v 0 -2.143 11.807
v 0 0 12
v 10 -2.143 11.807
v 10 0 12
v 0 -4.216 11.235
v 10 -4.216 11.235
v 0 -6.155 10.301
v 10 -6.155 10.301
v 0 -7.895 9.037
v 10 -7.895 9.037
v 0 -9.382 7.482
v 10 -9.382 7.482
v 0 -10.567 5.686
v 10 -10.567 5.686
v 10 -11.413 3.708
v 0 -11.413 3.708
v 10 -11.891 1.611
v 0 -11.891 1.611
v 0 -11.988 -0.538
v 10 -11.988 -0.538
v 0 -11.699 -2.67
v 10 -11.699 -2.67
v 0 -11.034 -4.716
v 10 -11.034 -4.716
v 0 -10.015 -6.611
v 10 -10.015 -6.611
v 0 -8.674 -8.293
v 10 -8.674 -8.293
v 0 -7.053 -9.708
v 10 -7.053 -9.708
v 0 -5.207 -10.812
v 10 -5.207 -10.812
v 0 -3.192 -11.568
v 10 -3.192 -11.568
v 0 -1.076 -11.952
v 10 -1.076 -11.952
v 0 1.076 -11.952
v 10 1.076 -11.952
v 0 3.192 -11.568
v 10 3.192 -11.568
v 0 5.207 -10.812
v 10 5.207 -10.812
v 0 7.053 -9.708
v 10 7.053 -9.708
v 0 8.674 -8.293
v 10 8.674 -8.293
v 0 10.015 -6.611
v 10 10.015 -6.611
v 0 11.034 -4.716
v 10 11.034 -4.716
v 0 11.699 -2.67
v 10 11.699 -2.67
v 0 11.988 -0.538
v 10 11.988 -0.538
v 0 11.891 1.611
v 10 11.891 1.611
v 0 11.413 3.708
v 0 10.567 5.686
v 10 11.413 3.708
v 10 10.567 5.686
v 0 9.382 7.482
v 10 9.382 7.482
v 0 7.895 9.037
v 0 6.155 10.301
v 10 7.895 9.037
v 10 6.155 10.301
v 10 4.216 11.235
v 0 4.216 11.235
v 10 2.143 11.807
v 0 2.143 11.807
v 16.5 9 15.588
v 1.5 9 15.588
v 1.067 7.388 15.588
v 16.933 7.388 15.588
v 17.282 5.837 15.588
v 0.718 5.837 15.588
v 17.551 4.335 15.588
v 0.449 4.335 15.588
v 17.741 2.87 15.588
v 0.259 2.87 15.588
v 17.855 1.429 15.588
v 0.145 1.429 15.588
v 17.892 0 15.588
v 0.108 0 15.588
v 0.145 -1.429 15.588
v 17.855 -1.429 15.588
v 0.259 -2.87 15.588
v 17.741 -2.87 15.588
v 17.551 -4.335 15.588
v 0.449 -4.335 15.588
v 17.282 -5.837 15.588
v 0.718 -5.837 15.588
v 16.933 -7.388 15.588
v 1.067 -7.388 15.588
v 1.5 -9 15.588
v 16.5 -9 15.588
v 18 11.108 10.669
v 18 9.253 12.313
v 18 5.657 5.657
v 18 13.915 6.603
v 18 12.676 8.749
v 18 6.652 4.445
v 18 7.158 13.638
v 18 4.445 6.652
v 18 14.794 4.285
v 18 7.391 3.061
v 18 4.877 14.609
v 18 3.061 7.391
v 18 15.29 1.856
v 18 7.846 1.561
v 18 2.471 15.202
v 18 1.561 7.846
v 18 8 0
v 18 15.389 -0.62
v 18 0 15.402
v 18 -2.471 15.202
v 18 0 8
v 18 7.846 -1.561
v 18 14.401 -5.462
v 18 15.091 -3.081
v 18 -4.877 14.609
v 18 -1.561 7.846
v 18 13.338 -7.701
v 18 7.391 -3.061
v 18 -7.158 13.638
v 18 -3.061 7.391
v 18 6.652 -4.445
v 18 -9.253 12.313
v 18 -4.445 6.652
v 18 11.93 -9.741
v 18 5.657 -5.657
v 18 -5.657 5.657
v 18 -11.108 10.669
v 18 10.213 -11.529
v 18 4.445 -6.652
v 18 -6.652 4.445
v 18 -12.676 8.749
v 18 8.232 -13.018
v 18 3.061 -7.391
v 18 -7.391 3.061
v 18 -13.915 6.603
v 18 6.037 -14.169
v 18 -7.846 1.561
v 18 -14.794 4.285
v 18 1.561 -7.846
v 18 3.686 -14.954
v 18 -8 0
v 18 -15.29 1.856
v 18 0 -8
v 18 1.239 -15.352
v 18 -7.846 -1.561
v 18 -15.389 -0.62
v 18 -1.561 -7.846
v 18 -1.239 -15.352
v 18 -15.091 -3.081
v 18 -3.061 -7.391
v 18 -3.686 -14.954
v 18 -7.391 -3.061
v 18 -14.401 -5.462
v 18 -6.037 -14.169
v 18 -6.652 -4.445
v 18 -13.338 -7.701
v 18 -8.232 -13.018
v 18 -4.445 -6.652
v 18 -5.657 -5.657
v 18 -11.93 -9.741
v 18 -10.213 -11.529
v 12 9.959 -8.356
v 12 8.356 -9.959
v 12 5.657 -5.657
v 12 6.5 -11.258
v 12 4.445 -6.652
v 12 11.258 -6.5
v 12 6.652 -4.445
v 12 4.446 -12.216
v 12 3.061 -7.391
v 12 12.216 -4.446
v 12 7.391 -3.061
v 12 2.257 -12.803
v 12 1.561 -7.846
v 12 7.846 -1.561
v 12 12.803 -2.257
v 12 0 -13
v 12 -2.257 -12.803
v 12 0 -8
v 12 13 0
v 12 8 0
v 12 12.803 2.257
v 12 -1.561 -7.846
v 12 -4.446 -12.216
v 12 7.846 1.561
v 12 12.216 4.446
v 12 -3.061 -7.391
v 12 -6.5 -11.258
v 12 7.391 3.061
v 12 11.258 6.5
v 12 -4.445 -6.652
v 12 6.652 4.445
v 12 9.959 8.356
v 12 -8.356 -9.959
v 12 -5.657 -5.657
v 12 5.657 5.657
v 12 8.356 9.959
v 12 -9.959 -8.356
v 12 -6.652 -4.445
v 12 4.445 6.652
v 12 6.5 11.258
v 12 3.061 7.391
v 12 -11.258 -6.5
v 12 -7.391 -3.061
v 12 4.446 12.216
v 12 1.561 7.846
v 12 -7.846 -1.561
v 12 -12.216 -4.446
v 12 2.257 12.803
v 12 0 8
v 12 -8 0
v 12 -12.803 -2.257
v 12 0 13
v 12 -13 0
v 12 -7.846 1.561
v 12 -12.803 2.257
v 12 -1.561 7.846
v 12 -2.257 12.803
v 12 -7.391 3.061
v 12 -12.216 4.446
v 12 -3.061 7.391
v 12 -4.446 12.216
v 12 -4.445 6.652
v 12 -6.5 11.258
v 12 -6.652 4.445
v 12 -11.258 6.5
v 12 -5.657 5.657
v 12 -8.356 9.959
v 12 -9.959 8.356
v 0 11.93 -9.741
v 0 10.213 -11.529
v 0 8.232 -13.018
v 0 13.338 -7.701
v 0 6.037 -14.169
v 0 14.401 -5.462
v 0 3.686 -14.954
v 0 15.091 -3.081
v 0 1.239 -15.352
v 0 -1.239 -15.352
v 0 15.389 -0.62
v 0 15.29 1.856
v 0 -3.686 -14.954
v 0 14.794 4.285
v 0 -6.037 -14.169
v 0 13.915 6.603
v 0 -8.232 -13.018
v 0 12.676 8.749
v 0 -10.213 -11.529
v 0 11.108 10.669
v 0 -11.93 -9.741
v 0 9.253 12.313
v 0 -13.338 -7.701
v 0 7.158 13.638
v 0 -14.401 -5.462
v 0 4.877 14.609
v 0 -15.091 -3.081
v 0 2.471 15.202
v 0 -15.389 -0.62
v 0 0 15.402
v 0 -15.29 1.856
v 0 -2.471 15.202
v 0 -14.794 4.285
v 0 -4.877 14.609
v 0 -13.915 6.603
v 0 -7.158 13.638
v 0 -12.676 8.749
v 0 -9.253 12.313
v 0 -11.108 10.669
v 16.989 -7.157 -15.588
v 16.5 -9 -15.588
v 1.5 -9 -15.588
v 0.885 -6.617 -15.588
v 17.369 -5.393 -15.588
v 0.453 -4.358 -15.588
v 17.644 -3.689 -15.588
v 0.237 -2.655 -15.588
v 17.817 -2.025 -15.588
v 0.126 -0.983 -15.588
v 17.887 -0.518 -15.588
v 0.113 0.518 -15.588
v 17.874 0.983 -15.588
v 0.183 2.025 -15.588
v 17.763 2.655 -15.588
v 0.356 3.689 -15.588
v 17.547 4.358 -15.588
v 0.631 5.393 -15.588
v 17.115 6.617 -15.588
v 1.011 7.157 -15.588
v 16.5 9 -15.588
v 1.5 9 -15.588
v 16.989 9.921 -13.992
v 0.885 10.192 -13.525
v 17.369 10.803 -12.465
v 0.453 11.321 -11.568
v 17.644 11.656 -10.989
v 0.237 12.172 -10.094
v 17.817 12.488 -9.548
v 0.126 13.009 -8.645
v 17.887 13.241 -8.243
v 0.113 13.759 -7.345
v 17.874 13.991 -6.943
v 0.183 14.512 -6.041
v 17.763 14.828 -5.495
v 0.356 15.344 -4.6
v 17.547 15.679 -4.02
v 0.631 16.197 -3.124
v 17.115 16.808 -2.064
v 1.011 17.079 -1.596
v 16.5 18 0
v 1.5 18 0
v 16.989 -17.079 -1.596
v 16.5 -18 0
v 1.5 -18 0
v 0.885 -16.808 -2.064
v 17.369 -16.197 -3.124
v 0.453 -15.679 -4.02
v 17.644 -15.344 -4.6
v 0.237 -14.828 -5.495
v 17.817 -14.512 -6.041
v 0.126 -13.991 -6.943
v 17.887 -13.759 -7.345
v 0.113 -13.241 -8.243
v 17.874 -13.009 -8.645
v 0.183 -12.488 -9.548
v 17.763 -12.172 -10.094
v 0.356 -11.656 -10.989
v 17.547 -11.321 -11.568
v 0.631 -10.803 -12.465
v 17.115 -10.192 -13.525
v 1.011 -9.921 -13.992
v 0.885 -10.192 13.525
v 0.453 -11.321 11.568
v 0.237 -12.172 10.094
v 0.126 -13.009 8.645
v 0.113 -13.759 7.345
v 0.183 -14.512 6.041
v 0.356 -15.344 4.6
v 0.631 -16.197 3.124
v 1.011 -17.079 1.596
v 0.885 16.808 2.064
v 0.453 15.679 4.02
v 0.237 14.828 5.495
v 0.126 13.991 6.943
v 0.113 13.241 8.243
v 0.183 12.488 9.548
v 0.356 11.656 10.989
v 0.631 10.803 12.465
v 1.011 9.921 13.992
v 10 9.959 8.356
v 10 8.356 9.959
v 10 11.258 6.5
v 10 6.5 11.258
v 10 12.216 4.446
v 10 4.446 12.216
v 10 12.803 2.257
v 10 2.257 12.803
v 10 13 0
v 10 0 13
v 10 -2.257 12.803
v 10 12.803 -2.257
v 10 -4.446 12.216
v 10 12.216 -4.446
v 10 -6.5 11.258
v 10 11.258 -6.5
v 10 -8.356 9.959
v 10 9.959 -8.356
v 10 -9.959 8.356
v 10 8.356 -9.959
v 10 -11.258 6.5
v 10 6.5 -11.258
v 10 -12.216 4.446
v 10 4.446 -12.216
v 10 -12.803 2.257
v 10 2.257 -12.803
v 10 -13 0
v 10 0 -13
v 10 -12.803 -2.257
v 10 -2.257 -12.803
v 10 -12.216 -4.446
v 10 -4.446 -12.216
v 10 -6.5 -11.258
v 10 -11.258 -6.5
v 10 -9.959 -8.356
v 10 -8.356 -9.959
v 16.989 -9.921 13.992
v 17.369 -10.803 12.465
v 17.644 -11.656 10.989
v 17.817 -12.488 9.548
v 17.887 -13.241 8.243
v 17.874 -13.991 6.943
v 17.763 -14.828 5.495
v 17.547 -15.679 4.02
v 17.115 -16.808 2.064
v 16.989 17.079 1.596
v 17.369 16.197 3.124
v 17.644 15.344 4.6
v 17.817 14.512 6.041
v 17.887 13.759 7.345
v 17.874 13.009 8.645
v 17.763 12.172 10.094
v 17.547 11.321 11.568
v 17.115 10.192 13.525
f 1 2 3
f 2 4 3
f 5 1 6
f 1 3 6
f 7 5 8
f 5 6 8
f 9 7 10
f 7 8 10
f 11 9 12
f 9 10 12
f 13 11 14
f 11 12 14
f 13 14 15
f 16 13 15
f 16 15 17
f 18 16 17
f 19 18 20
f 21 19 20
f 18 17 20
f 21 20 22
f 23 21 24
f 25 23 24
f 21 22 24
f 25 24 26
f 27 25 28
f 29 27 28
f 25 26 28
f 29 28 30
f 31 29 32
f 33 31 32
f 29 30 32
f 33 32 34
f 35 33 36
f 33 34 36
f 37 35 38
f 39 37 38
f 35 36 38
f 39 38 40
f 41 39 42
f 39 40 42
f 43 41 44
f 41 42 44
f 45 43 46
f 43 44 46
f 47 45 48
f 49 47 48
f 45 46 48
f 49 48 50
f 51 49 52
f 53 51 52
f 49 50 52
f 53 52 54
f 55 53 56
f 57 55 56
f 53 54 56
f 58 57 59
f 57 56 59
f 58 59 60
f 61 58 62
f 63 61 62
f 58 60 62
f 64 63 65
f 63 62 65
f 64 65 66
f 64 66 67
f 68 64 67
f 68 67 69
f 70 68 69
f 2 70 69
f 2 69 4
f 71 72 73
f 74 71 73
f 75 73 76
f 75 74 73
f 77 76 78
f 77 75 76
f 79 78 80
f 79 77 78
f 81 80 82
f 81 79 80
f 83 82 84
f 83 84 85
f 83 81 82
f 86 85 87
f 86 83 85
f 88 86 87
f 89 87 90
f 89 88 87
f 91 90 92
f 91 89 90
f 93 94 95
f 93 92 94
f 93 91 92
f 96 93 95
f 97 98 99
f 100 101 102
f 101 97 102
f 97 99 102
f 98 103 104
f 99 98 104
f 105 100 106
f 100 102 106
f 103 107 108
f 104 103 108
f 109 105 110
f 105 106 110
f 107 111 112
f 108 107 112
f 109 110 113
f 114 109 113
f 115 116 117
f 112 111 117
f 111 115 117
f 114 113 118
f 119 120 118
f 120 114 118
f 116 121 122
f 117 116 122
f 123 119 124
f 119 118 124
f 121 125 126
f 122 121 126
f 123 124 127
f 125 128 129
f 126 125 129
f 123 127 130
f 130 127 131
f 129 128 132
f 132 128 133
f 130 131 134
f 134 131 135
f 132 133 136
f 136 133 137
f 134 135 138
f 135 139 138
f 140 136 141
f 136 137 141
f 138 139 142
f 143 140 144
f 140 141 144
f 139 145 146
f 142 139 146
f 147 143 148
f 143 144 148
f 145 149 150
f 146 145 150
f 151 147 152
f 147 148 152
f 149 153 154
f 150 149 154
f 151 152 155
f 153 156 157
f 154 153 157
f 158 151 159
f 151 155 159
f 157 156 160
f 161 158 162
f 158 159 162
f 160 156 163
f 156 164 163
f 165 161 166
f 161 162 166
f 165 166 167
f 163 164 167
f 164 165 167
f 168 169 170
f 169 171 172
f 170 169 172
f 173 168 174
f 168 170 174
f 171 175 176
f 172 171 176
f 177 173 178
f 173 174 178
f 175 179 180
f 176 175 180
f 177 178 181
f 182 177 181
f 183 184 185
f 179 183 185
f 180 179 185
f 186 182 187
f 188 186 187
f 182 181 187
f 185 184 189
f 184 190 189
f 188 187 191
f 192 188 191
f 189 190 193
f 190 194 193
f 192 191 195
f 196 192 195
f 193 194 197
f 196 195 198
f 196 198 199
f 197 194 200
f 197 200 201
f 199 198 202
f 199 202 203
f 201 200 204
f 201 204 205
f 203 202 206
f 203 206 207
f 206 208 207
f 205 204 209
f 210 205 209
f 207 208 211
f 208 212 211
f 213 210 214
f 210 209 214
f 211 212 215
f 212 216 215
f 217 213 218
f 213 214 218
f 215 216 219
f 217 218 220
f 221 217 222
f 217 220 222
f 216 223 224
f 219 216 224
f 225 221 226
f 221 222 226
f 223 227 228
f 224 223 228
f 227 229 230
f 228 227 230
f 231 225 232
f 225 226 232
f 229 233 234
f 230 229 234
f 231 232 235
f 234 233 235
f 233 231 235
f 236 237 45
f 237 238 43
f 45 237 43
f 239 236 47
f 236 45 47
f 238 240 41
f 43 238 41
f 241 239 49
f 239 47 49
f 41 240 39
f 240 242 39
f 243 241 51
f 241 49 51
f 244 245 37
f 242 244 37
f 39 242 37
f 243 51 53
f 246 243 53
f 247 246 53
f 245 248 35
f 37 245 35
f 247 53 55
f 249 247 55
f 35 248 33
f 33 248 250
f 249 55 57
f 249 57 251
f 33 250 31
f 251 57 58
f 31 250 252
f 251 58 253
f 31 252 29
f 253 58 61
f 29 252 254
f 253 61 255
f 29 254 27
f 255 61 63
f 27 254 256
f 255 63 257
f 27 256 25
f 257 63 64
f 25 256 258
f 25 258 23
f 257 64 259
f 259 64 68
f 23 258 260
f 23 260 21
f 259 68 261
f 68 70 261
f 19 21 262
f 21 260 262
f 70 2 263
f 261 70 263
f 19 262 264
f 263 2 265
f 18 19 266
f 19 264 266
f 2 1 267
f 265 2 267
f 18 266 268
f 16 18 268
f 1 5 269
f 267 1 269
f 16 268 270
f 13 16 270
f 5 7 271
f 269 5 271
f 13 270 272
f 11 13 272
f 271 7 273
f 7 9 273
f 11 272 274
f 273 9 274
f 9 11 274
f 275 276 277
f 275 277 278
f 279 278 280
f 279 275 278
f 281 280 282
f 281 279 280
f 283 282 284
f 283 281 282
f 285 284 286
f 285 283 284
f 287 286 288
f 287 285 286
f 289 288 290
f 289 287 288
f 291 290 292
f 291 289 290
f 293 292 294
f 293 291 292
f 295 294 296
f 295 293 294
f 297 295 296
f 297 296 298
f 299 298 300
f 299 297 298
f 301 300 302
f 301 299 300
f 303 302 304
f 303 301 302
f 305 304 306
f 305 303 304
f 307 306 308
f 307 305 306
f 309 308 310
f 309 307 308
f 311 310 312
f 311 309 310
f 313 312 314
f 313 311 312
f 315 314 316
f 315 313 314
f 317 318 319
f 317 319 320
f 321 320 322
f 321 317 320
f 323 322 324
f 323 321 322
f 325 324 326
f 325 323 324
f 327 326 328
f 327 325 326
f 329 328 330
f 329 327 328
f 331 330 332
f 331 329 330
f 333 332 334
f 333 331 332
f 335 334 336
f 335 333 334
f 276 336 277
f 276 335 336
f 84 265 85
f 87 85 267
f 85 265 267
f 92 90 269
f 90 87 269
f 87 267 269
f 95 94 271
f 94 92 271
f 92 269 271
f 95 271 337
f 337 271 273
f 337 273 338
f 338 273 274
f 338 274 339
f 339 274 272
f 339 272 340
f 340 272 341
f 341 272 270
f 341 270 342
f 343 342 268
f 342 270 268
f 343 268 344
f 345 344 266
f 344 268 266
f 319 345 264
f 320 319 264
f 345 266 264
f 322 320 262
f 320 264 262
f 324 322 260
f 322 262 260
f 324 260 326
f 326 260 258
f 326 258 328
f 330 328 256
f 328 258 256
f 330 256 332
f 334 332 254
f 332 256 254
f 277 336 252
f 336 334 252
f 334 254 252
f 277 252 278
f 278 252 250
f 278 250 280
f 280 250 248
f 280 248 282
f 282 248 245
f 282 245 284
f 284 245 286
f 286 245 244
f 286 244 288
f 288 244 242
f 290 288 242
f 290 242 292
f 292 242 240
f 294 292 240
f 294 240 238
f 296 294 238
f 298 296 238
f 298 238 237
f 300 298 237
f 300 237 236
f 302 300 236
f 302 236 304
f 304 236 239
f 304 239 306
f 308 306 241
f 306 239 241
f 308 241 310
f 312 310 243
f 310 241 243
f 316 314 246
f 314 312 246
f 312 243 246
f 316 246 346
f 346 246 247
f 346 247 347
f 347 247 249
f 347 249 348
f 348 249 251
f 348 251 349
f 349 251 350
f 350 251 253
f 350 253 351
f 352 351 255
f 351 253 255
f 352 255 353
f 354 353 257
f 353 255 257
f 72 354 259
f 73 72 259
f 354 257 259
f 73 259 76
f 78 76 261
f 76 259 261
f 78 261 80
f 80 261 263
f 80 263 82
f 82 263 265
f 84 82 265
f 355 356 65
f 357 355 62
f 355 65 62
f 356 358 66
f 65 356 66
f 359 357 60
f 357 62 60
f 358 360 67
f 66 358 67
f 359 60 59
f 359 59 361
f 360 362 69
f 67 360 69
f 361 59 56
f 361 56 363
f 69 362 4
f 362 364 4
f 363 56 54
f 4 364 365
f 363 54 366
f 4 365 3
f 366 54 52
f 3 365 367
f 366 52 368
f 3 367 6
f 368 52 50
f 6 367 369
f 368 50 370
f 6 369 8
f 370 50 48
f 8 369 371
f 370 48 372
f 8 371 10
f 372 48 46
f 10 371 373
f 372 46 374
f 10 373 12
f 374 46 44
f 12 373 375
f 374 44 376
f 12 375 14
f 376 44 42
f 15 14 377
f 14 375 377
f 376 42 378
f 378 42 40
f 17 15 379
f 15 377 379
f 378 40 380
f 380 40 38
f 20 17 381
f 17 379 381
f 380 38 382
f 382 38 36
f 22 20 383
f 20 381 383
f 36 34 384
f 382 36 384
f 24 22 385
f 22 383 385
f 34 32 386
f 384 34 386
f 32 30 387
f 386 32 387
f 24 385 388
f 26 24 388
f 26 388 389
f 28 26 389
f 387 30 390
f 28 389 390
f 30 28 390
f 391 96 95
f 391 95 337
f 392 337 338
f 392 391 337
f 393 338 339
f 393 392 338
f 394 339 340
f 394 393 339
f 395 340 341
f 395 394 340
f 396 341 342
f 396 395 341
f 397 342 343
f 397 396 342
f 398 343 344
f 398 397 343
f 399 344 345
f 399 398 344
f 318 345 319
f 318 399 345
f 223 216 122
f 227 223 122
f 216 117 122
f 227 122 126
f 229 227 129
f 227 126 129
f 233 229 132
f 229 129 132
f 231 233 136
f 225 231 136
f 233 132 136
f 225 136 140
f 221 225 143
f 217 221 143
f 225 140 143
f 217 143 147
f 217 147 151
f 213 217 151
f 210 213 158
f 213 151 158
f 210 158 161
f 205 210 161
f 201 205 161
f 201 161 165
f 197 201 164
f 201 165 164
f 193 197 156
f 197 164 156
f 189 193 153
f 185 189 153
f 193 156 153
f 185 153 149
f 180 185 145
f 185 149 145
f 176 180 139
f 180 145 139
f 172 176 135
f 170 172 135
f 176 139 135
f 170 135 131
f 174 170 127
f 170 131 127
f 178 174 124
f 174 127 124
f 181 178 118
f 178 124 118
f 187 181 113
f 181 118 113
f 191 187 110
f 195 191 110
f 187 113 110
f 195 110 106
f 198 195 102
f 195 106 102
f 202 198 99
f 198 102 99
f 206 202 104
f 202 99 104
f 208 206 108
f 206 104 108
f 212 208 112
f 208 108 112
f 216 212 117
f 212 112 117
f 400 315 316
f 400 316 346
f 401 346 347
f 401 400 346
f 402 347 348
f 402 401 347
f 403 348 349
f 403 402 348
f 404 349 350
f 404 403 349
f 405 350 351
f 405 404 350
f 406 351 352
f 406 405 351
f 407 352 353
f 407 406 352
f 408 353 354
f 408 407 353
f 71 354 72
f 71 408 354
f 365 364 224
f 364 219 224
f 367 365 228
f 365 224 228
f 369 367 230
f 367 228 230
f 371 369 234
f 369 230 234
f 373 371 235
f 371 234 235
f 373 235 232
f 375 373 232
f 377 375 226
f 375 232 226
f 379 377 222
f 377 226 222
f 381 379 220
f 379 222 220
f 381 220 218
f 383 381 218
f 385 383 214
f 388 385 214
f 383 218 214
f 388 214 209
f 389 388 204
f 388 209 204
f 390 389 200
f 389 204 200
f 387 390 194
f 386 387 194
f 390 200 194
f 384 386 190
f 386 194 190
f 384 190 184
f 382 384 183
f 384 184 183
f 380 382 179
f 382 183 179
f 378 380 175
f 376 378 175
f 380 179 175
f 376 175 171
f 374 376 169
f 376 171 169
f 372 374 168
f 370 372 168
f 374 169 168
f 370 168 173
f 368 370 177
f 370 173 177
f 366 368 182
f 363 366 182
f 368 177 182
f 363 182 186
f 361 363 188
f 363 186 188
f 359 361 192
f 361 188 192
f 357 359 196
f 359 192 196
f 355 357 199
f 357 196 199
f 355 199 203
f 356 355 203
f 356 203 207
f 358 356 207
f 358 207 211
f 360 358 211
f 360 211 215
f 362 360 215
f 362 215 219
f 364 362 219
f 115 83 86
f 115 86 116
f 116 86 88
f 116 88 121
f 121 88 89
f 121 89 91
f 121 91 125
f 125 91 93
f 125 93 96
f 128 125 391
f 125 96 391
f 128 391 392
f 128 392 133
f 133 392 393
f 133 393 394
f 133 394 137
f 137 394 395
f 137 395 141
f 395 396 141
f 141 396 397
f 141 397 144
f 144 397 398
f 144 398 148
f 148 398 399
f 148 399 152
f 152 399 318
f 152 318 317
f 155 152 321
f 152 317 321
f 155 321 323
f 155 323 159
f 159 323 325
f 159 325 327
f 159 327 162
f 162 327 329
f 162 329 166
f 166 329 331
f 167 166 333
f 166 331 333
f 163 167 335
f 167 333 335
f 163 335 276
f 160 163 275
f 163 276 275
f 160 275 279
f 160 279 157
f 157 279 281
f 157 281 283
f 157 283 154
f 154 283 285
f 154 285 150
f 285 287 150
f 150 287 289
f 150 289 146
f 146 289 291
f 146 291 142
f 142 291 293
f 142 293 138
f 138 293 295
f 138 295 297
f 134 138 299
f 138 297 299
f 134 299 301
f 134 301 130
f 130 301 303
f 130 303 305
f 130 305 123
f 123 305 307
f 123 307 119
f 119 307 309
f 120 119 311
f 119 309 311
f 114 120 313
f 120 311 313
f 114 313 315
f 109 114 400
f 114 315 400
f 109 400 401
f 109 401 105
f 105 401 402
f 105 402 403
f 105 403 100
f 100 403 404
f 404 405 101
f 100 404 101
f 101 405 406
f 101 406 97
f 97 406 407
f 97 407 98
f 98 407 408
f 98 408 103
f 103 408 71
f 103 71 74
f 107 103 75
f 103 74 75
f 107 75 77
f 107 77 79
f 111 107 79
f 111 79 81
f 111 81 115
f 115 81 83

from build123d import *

# Parameters (mm, degrees)
SKETCH_2_OUTSIDE_W  = 48.8
SKETCH_2_OUTSIDE_H  = 48.8
CUT_EXTRUDE_1_DEPTH = 30


with BuildPart() as part:
    # Эскиз1 → Повернуть1 (revolve)
    with BuildSketch(Plane.XY, mode=Mode.PRIVATE) as revolve_1_sk:
        Polygon((18, 12), (18, 15.401923789), (16.5, 18), (1.5, 18), (0, 15.401923789), (0, 12), (10, 12), (10, 13), (12, 13), (12, 8), (18, 8), align=None)
    revolve(revolve_1_sk.sketch.rotate(Axis((0, 0, 0), (1, 0, 0)), 90), axis=Axis((0, 0, 0), (1, 0, 0)))

    # Эскиз2 outside → Вырез-Вытянуть1 (cut)
    with BuildSketch(Plane(origin=(18, 0, 0), x_dir=(0, 0, -1), z_dir=(1, 0, 0))):
        Rectangle(SKETCH_2_OUTSIDE_W, SKETCH_2_OUTSIDE_H)
        Polygon((0, 18), (-15.588457268, 9), (-15.588457268, -9), (0, -18), (15.588457268, -9), (15.588457268, 9), align=None, mode=Mode.SUBTRACT)
    extrude(amount=-CUT_EXTRUDE_1_DEPTH, mode=Mode.SUBTRACT)


solid = part.part
